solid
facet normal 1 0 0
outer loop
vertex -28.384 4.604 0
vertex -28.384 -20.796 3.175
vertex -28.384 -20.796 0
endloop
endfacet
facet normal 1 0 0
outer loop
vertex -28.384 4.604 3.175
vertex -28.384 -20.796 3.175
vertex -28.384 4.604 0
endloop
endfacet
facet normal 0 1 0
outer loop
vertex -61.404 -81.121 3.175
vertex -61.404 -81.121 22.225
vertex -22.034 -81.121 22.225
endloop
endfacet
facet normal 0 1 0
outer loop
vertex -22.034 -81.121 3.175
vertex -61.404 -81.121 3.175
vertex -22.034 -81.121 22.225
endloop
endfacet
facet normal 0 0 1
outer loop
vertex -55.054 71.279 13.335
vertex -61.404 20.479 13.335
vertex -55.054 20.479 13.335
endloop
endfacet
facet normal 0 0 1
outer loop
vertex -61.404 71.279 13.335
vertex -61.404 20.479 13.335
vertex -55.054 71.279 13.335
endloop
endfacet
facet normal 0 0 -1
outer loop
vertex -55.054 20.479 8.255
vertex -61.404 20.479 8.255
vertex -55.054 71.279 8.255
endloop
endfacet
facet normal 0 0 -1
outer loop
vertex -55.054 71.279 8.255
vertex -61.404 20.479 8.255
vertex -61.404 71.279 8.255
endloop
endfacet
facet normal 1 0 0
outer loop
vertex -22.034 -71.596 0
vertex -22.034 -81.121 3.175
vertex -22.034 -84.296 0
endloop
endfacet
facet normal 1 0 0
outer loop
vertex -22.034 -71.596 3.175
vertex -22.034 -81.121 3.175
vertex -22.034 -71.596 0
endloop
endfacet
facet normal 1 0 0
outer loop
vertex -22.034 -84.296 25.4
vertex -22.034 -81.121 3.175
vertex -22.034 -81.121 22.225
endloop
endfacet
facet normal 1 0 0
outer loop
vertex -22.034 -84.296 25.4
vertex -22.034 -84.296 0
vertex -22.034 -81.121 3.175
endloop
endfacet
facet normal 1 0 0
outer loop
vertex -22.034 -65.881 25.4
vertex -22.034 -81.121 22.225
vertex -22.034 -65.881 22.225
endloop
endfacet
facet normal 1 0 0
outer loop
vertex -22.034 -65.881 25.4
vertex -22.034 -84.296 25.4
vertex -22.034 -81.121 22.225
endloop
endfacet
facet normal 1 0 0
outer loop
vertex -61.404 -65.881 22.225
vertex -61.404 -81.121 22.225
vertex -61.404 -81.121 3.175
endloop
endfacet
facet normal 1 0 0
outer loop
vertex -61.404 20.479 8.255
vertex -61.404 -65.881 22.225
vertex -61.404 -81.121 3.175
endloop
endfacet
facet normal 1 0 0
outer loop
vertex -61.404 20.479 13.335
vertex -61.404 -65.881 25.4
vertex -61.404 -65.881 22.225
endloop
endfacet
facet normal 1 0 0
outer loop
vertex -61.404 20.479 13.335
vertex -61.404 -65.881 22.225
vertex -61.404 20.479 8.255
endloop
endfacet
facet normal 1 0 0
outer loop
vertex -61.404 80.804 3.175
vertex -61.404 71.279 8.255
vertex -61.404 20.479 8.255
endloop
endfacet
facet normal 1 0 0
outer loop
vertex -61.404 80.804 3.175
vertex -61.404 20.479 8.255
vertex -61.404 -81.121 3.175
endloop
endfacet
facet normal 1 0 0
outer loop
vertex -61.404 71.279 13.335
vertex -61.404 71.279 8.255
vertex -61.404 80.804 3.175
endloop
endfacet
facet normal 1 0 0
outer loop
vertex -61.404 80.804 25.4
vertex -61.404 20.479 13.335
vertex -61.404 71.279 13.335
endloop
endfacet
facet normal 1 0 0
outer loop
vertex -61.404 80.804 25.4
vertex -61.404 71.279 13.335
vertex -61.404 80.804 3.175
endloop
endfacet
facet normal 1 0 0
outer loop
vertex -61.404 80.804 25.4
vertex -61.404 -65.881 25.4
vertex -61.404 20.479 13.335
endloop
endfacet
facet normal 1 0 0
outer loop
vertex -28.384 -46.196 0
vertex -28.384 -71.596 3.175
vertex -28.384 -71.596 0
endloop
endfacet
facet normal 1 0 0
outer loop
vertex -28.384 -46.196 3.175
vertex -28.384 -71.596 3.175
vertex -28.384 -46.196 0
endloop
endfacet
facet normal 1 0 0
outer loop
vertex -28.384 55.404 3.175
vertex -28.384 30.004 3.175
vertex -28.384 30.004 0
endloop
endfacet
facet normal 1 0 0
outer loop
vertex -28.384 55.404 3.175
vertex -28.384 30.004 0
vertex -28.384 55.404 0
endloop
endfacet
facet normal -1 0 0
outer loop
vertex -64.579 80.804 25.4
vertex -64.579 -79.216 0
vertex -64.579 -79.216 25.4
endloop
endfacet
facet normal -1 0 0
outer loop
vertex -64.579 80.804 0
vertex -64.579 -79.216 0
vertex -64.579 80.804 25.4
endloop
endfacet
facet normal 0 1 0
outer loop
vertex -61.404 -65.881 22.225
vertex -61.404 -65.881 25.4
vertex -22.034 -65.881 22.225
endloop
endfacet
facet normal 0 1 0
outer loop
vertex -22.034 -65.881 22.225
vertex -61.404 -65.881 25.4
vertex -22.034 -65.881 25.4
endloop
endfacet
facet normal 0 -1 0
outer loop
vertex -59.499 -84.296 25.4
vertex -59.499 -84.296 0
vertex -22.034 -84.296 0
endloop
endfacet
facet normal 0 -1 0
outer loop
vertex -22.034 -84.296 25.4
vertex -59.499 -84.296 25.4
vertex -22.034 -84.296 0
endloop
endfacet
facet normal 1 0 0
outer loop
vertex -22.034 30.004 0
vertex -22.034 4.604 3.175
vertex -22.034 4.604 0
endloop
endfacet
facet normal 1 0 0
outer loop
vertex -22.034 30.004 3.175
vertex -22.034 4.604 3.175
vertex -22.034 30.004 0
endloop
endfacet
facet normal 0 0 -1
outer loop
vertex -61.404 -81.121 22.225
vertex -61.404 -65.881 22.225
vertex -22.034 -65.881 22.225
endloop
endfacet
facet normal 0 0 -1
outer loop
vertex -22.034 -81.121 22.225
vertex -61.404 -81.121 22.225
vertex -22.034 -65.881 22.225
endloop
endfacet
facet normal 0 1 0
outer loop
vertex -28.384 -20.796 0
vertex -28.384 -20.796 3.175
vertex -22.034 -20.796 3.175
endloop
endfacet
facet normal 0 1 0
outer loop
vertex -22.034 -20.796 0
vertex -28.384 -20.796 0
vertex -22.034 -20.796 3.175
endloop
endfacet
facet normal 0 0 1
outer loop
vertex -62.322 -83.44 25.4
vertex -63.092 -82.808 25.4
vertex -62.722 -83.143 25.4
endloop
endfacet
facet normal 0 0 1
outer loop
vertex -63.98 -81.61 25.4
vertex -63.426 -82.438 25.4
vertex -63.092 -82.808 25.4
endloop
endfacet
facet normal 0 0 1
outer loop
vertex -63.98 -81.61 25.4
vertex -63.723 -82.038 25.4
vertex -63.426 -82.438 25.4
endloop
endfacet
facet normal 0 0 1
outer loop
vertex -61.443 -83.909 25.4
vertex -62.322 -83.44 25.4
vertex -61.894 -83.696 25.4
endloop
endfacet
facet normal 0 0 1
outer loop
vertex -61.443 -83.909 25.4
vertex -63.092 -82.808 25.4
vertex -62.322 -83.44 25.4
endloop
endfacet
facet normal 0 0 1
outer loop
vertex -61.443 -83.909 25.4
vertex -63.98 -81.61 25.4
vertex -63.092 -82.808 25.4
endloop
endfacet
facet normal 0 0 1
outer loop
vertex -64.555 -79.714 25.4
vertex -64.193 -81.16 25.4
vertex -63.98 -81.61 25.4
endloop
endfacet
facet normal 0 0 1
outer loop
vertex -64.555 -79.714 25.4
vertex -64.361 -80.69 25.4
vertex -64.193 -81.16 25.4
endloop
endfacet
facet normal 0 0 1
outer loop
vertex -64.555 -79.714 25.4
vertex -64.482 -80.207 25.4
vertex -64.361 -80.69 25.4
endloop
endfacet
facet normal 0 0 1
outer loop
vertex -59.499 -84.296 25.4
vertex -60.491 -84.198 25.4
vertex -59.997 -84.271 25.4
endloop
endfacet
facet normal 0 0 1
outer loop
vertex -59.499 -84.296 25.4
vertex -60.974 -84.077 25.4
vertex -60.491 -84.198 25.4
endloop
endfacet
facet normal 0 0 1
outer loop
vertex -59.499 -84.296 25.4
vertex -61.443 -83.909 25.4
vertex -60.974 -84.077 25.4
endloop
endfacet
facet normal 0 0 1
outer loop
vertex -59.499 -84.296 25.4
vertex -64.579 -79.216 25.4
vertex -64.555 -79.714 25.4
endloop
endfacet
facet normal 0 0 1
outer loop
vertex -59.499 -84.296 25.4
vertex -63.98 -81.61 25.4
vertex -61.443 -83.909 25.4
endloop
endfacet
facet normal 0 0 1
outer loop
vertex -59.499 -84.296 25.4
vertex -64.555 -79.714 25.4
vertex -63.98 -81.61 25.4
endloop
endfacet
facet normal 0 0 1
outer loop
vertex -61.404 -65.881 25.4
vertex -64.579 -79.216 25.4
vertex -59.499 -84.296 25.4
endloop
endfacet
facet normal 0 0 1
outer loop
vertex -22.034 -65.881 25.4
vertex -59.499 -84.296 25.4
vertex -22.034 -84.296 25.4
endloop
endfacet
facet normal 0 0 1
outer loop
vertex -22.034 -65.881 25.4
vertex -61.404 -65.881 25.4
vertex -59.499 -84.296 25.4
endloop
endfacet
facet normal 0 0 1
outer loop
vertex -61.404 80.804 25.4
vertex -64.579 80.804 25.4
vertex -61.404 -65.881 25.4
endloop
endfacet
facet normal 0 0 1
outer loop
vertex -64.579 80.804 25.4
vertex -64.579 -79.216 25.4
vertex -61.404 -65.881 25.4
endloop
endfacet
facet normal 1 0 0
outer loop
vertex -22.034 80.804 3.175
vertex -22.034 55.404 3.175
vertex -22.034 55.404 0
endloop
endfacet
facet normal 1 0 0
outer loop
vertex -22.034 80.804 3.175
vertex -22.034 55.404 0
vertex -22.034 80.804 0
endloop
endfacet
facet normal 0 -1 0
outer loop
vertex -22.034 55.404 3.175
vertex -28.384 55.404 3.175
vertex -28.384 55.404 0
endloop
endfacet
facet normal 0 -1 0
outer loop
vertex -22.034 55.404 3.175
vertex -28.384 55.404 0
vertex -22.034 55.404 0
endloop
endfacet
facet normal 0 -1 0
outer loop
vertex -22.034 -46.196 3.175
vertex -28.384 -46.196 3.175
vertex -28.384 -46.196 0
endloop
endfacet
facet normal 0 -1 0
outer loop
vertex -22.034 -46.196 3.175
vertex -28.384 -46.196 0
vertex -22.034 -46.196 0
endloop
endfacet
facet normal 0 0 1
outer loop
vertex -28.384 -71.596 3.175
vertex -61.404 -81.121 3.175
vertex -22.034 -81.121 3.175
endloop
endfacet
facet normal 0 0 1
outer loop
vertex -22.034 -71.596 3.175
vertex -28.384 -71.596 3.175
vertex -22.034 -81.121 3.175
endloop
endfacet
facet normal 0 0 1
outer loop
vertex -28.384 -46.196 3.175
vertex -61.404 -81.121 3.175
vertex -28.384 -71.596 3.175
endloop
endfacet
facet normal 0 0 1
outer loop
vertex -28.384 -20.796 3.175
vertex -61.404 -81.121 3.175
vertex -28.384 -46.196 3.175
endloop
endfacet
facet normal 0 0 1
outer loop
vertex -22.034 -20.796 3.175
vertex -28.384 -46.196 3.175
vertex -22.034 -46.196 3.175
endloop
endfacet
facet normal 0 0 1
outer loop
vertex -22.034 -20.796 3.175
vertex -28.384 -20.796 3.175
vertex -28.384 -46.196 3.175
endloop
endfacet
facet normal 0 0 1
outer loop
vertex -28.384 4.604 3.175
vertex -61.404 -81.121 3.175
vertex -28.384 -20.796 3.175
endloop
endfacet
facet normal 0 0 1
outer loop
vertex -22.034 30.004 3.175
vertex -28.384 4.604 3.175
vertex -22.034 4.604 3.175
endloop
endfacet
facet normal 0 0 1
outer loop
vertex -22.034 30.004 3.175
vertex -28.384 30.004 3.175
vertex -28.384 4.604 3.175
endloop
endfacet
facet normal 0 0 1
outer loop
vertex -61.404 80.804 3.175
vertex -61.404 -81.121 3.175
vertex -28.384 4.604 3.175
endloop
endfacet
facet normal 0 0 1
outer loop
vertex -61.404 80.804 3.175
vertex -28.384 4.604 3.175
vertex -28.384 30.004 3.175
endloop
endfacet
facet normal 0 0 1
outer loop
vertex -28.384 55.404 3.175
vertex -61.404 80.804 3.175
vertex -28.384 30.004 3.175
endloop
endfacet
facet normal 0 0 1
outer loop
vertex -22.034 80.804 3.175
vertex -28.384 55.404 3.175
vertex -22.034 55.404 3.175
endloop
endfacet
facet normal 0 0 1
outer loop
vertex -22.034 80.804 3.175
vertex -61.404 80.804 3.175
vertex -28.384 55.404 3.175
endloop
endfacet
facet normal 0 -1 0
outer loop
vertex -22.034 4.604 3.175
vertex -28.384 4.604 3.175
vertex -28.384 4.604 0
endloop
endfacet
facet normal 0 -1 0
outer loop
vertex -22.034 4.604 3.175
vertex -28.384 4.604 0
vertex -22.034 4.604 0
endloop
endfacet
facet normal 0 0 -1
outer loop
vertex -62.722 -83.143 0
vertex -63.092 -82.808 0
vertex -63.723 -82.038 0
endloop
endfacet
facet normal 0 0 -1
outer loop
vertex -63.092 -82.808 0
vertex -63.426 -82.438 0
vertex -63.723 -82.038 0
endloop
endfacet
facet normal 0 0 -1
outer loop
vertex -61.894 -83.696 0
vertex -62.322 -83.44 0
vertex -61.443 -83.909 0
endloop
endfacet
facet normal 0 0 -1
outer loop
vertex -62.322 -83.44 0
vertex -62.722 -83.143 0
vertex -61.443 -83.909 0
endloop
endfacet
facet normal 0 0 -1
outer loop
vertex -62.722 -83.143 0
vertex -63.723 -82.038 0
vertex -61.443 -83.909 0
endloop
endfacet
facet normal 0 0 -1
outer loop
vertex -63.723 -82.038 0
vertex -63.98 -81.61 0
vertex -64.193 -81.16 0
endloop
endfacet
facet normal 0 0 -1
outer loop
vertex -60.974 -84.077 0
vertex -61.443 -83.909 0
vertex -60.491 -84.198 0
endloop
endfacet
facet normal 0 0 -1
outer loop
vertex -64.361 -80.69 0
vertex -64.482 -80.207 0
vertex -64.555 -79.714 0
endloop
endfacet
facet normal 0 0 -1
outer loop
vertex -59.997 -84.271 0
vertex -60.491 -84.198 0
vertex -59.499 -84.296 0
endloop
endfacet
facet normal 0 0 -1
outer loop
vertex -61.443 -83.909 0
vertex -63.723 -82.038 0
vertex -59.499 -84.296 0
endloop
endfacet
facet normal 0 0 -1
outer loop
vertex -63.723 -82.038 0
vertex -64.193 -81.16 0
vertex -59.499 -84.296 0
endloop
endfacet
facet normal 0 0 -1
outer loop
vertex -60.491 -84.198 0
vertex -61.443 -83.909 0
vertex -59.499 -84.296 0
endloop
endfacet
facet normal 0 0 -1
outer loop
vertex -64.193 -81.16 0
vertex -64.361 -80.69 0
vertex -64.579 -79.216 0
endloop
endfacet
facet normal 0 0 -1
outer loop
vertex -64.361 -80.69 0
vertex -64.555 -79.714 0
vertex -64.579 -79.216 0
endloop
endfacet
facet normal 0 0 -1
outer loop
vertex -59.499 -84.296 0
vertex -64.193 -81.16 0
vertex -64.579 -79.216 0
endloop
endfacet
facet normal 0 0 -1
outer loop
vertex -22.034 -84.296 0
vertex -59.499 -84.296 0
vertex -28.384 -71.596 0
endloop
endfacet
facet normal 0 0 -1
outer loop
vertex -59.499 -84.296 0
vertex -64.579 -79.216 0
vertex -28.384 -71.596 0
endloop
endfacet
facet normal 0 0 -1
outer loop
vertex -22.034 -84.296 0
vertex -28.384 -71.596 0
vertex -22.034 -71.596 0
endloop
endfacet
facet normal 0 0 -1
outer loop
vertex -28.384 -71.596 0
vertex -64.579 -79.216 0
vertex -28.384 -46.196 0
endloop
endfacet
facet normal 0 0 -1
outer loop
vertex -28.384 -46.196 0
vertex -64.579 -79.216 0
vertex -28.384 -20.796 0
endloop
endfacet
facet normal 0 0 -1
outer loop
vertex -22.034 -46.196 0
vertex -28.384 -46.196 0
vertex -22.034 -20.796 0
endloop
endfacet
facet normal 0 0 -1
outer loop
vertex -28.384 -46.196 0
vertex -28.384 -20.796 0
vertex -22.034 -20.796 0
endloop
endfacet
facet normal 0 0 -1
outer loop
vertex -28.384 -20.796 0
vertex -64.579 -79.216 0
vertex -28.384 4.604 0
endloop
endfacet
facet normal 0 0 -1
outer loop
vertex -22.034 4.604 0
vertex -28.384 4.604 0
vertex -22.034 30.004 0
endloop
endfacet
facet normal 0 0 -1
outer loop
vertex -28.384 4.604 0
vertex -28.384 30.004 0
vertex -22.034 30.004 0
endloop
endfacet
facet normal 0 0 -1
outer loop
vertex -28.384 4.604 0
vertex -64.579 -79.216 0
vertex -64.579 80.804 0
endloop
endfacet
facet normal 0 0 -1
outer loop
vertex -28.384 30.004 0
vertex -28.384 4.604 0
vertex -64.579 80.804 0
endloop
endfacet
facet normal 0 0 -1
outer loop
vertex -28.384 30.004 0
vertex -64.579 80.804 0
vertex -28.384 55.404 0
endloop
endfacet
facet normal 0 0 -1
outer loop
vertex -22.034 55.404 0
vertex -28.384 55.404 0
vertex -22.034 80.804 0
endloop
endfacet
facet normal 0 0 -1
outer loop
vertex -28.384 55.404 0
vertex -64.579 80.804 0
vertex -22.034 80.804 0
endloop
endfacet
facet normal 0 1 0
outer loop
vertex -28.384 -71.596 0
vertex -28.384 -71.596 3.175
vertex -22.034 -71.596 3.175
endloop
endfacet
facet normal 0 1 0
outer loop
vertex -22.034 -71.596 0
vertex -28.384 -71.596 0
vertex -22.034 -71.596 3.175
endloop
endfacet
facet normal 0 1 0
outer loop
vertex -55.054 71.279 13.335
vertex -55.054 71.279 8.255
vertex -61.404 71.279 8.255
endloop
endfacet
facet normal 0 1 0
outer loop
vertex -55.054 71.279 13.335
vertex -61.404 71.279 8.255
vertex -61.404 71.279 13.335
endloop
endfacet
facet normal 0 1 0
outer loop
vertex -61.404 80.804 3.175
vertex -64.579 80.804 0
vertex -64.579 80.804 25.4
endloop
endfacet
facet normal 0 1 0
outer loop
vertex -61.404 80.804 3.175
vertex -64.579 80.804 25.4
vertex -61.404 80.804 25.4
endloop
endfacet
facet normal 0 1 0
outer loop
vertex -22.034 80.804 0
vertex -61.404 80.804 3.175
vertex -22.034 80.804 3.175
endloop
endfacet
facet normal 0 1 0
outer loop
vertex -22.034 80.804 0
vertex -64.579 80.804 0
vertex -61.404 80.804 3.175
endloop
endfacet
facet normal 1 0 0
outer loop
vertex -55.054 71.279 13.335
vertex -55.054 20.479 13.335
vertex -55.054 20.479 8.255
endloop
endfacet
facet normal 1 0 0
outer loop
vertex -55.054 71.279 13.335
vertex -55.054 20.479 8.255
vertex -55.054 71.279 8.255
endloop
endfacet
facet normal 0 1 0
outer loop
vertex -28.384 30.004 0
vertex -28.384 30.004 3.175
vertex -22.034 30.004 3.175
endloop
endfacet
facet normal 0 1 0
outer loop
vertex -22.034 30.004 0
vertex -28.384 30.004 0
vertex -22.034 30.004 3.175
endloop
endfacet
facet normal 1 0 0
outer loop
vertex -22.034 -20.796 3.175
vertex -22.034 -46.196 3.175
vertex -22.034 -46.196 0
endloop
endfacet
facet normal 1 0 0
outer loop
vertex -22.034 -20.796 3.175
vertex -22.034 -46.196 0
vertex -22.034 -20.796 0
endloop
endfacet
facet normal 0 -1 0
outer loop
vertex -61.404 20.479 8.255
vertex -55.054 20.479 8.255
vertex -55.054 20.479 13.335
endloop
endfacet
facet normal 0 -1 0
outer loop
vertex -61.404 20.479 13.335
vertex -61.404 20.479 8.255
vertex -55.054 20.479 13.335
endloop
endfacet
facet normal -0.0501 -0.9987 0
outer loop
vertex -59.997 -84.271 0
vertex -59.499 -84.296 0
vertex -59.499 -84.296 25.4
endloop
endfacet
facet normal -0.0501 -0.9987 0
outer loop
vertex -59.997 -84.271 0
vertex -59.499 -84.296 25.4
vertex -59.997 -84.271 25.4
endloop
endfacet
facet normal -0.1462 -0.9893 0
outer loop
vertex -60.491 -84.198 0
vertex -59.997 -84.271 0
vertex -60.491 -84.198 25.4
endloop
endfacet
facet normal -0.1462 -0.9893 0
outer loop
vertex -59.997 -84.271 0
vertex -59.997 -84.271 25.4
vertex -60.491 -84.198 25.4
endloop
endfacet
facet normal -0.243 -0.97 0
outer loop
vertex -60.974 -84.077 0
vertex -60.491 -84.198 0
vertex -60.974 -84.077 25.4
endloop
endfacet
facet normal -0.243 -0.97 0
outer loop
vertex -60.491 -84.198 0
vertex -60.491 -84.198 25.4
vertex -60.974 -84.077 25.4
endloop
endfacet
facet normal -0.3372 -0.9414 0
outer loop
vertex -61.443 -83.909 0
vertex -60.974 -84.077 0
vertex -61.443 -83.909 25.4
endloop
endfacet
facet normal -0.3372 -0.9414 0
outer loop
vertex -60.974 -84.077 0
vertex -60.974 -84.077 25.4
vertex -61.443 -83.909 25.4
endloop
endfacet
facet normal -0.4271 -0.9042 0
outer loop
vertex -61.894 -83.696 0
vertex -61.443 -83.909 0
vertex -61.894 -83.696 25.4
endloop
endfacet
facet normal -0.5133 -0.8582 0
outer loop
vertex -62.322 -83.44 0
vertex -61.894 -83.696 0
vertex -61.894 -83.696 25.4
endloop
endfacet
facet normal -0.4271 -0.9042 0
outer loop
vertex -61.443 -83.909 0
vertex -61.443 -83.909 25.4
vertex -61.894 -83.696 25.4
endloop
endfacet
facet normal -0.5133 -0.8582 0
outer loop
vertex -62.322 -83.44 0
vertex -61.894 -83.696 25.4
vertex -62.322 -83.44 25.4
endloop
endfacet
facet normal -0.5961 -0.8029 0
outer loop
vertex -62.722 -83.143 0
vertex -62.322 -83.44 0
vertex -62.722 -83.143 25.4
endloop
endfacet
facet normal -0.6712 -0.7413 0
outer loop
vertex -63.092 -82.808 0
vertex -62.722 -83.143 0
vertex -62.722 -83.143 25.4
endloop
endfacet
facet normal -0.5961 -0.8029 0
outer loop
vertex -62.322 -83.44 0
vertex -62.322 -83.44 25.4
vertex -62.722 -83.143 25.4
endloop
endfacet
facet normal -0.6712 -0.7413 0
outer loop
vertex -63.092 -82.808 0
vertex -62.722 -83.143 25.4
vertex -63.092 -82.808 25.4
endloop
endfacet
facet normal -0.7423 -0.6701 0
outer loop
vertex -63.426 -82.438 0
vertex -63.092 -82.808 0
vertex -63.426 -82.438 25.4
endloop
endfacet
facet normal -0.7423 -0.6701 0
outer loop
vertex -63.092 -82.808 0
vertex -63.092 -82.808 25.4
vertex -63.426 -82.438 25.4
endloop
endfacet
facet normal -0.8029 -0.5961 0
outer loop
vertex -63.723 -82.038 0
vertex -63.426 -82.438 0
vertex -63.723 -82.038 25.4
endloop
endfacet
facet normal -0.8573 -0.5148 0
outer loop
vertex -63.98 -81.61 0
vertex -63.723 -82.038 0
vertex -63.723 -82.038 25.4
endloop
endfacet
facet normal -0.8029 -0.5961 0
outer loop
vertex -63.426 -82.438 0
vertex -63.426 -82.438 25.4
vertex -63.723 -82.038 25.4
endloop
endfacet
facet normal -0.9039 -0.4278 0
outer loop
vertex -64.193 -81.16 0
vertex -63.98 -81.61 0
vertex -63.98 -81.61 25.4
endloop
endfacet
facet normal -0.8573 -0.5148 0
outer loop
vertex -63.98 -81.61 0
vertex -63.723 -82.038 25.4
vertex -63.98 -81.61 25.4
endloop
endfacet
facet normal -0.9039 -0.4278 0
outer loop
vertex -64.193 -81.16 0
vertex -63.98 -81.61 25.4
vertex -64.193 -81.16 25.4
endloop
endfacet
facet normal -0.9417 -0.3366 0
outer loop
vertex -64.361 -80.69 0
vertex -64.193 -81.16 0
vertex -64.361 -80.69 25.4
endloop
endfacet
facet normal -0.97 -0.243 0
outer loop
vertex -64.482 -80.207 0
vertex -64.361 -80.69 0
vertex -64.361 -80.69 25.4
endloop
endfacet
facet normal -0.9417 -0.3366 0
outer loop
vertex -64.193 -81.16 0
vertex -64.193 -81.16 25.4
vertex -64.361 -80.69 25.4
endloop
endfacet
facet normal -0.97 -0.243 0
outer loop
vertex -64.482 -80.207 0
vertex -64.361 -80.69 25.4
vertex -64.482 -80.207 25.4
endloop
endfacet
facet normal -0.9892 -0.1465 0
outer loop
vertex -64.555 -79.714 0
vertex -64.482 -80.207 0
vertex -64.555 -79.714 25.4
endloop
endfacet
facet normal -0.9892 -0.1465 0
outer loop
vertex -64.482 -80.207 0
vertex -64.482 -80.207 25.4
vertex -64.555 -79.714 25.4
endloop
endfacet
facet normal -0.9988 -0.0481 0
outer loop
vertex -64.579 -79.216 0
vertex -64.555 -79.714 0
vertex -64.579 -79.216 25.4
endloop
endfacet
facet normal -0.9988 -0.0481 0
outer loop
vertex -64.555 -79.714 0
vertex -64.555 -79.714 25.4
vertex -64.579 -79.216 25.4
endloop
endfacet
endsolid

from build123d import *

# Parameters (mm, degrees)
F0_W     = 42.545
F0_H     = 165.1
F1_DEPTH = 25.4
F2_W     = 39.37
F2_H     = 161.925
F3_DEPTH = 22.225
F4_W     = 39.37
F4_H     = 15.24
F5_DEPTH = 3.175
F6_W     = 50.8
F6_H     = 5.08
F7_DEPTH = 6.35
F8_W     = 6.35
F8_H     = 25.4
F9_DEPTH = 3.176
F10_R    = 5.08


with BuildPart() as f1:
    # F0 (on Top) → F1 (new body)
    with BuildSketch(Plane.XY):
        with Locations((-43.306965, -1.745749)):
            Rectangle(F0_W, F0_H)
    extrude(amount=F1_DEPTH)

    # F2 (on face) → F3 (cut)
    with BuildSketch(Plane.XY.offset(25.4)):
        with Locations((-41.719465, -0.158249)):
            Rectangle(F2_W, F2_H)
    extrude(amount=-F3_DEPTH, mode=Mode.SUBTRACT)

    # F4 (on face) → F5 (join)
    with BuildSketch(Plane.XY.offset(25.4)):
        with Locations((-41.719465, -73.500749)):
            Rectangle(F4_W, F4_H)
    extrude(amount=-F5_DEPTH)

    # F6 (on face) → F7 (join)
    with BuildSketch(Plane.YZ.offset(-61.404465)):
        with Locations((45.879251, 10.795)):
            Rectangle(F6_W, F6_H)
    extrude(amount=F7_DEPTH)

    # F8 (on face) → F9 (cut, through all)
    with BuildSketch(Plane.XY.offset(3.175)):
        with Locations((-25.209465, -58.895749)):
            Rectangle(F8_W, F8_H)
        with Locations((-25.209465, -8.095749)):
            Rectangle(F8_W, F8_H)
        with Locations((-25.209465, 42.704251)):
            Rectangle(F8_W, F8_H)
    extrude(amount=-F9_DEPTH, mode=Mode.SUBTRACT)

    # F10
    f10_edges = [f1.edges().sort_by_distance(p)[0] for p in [
        (-64.579465, -84.295749, 12.7),
    ]]
    fillet(f10_edges, radius=F10_R)


solid = f1.part
